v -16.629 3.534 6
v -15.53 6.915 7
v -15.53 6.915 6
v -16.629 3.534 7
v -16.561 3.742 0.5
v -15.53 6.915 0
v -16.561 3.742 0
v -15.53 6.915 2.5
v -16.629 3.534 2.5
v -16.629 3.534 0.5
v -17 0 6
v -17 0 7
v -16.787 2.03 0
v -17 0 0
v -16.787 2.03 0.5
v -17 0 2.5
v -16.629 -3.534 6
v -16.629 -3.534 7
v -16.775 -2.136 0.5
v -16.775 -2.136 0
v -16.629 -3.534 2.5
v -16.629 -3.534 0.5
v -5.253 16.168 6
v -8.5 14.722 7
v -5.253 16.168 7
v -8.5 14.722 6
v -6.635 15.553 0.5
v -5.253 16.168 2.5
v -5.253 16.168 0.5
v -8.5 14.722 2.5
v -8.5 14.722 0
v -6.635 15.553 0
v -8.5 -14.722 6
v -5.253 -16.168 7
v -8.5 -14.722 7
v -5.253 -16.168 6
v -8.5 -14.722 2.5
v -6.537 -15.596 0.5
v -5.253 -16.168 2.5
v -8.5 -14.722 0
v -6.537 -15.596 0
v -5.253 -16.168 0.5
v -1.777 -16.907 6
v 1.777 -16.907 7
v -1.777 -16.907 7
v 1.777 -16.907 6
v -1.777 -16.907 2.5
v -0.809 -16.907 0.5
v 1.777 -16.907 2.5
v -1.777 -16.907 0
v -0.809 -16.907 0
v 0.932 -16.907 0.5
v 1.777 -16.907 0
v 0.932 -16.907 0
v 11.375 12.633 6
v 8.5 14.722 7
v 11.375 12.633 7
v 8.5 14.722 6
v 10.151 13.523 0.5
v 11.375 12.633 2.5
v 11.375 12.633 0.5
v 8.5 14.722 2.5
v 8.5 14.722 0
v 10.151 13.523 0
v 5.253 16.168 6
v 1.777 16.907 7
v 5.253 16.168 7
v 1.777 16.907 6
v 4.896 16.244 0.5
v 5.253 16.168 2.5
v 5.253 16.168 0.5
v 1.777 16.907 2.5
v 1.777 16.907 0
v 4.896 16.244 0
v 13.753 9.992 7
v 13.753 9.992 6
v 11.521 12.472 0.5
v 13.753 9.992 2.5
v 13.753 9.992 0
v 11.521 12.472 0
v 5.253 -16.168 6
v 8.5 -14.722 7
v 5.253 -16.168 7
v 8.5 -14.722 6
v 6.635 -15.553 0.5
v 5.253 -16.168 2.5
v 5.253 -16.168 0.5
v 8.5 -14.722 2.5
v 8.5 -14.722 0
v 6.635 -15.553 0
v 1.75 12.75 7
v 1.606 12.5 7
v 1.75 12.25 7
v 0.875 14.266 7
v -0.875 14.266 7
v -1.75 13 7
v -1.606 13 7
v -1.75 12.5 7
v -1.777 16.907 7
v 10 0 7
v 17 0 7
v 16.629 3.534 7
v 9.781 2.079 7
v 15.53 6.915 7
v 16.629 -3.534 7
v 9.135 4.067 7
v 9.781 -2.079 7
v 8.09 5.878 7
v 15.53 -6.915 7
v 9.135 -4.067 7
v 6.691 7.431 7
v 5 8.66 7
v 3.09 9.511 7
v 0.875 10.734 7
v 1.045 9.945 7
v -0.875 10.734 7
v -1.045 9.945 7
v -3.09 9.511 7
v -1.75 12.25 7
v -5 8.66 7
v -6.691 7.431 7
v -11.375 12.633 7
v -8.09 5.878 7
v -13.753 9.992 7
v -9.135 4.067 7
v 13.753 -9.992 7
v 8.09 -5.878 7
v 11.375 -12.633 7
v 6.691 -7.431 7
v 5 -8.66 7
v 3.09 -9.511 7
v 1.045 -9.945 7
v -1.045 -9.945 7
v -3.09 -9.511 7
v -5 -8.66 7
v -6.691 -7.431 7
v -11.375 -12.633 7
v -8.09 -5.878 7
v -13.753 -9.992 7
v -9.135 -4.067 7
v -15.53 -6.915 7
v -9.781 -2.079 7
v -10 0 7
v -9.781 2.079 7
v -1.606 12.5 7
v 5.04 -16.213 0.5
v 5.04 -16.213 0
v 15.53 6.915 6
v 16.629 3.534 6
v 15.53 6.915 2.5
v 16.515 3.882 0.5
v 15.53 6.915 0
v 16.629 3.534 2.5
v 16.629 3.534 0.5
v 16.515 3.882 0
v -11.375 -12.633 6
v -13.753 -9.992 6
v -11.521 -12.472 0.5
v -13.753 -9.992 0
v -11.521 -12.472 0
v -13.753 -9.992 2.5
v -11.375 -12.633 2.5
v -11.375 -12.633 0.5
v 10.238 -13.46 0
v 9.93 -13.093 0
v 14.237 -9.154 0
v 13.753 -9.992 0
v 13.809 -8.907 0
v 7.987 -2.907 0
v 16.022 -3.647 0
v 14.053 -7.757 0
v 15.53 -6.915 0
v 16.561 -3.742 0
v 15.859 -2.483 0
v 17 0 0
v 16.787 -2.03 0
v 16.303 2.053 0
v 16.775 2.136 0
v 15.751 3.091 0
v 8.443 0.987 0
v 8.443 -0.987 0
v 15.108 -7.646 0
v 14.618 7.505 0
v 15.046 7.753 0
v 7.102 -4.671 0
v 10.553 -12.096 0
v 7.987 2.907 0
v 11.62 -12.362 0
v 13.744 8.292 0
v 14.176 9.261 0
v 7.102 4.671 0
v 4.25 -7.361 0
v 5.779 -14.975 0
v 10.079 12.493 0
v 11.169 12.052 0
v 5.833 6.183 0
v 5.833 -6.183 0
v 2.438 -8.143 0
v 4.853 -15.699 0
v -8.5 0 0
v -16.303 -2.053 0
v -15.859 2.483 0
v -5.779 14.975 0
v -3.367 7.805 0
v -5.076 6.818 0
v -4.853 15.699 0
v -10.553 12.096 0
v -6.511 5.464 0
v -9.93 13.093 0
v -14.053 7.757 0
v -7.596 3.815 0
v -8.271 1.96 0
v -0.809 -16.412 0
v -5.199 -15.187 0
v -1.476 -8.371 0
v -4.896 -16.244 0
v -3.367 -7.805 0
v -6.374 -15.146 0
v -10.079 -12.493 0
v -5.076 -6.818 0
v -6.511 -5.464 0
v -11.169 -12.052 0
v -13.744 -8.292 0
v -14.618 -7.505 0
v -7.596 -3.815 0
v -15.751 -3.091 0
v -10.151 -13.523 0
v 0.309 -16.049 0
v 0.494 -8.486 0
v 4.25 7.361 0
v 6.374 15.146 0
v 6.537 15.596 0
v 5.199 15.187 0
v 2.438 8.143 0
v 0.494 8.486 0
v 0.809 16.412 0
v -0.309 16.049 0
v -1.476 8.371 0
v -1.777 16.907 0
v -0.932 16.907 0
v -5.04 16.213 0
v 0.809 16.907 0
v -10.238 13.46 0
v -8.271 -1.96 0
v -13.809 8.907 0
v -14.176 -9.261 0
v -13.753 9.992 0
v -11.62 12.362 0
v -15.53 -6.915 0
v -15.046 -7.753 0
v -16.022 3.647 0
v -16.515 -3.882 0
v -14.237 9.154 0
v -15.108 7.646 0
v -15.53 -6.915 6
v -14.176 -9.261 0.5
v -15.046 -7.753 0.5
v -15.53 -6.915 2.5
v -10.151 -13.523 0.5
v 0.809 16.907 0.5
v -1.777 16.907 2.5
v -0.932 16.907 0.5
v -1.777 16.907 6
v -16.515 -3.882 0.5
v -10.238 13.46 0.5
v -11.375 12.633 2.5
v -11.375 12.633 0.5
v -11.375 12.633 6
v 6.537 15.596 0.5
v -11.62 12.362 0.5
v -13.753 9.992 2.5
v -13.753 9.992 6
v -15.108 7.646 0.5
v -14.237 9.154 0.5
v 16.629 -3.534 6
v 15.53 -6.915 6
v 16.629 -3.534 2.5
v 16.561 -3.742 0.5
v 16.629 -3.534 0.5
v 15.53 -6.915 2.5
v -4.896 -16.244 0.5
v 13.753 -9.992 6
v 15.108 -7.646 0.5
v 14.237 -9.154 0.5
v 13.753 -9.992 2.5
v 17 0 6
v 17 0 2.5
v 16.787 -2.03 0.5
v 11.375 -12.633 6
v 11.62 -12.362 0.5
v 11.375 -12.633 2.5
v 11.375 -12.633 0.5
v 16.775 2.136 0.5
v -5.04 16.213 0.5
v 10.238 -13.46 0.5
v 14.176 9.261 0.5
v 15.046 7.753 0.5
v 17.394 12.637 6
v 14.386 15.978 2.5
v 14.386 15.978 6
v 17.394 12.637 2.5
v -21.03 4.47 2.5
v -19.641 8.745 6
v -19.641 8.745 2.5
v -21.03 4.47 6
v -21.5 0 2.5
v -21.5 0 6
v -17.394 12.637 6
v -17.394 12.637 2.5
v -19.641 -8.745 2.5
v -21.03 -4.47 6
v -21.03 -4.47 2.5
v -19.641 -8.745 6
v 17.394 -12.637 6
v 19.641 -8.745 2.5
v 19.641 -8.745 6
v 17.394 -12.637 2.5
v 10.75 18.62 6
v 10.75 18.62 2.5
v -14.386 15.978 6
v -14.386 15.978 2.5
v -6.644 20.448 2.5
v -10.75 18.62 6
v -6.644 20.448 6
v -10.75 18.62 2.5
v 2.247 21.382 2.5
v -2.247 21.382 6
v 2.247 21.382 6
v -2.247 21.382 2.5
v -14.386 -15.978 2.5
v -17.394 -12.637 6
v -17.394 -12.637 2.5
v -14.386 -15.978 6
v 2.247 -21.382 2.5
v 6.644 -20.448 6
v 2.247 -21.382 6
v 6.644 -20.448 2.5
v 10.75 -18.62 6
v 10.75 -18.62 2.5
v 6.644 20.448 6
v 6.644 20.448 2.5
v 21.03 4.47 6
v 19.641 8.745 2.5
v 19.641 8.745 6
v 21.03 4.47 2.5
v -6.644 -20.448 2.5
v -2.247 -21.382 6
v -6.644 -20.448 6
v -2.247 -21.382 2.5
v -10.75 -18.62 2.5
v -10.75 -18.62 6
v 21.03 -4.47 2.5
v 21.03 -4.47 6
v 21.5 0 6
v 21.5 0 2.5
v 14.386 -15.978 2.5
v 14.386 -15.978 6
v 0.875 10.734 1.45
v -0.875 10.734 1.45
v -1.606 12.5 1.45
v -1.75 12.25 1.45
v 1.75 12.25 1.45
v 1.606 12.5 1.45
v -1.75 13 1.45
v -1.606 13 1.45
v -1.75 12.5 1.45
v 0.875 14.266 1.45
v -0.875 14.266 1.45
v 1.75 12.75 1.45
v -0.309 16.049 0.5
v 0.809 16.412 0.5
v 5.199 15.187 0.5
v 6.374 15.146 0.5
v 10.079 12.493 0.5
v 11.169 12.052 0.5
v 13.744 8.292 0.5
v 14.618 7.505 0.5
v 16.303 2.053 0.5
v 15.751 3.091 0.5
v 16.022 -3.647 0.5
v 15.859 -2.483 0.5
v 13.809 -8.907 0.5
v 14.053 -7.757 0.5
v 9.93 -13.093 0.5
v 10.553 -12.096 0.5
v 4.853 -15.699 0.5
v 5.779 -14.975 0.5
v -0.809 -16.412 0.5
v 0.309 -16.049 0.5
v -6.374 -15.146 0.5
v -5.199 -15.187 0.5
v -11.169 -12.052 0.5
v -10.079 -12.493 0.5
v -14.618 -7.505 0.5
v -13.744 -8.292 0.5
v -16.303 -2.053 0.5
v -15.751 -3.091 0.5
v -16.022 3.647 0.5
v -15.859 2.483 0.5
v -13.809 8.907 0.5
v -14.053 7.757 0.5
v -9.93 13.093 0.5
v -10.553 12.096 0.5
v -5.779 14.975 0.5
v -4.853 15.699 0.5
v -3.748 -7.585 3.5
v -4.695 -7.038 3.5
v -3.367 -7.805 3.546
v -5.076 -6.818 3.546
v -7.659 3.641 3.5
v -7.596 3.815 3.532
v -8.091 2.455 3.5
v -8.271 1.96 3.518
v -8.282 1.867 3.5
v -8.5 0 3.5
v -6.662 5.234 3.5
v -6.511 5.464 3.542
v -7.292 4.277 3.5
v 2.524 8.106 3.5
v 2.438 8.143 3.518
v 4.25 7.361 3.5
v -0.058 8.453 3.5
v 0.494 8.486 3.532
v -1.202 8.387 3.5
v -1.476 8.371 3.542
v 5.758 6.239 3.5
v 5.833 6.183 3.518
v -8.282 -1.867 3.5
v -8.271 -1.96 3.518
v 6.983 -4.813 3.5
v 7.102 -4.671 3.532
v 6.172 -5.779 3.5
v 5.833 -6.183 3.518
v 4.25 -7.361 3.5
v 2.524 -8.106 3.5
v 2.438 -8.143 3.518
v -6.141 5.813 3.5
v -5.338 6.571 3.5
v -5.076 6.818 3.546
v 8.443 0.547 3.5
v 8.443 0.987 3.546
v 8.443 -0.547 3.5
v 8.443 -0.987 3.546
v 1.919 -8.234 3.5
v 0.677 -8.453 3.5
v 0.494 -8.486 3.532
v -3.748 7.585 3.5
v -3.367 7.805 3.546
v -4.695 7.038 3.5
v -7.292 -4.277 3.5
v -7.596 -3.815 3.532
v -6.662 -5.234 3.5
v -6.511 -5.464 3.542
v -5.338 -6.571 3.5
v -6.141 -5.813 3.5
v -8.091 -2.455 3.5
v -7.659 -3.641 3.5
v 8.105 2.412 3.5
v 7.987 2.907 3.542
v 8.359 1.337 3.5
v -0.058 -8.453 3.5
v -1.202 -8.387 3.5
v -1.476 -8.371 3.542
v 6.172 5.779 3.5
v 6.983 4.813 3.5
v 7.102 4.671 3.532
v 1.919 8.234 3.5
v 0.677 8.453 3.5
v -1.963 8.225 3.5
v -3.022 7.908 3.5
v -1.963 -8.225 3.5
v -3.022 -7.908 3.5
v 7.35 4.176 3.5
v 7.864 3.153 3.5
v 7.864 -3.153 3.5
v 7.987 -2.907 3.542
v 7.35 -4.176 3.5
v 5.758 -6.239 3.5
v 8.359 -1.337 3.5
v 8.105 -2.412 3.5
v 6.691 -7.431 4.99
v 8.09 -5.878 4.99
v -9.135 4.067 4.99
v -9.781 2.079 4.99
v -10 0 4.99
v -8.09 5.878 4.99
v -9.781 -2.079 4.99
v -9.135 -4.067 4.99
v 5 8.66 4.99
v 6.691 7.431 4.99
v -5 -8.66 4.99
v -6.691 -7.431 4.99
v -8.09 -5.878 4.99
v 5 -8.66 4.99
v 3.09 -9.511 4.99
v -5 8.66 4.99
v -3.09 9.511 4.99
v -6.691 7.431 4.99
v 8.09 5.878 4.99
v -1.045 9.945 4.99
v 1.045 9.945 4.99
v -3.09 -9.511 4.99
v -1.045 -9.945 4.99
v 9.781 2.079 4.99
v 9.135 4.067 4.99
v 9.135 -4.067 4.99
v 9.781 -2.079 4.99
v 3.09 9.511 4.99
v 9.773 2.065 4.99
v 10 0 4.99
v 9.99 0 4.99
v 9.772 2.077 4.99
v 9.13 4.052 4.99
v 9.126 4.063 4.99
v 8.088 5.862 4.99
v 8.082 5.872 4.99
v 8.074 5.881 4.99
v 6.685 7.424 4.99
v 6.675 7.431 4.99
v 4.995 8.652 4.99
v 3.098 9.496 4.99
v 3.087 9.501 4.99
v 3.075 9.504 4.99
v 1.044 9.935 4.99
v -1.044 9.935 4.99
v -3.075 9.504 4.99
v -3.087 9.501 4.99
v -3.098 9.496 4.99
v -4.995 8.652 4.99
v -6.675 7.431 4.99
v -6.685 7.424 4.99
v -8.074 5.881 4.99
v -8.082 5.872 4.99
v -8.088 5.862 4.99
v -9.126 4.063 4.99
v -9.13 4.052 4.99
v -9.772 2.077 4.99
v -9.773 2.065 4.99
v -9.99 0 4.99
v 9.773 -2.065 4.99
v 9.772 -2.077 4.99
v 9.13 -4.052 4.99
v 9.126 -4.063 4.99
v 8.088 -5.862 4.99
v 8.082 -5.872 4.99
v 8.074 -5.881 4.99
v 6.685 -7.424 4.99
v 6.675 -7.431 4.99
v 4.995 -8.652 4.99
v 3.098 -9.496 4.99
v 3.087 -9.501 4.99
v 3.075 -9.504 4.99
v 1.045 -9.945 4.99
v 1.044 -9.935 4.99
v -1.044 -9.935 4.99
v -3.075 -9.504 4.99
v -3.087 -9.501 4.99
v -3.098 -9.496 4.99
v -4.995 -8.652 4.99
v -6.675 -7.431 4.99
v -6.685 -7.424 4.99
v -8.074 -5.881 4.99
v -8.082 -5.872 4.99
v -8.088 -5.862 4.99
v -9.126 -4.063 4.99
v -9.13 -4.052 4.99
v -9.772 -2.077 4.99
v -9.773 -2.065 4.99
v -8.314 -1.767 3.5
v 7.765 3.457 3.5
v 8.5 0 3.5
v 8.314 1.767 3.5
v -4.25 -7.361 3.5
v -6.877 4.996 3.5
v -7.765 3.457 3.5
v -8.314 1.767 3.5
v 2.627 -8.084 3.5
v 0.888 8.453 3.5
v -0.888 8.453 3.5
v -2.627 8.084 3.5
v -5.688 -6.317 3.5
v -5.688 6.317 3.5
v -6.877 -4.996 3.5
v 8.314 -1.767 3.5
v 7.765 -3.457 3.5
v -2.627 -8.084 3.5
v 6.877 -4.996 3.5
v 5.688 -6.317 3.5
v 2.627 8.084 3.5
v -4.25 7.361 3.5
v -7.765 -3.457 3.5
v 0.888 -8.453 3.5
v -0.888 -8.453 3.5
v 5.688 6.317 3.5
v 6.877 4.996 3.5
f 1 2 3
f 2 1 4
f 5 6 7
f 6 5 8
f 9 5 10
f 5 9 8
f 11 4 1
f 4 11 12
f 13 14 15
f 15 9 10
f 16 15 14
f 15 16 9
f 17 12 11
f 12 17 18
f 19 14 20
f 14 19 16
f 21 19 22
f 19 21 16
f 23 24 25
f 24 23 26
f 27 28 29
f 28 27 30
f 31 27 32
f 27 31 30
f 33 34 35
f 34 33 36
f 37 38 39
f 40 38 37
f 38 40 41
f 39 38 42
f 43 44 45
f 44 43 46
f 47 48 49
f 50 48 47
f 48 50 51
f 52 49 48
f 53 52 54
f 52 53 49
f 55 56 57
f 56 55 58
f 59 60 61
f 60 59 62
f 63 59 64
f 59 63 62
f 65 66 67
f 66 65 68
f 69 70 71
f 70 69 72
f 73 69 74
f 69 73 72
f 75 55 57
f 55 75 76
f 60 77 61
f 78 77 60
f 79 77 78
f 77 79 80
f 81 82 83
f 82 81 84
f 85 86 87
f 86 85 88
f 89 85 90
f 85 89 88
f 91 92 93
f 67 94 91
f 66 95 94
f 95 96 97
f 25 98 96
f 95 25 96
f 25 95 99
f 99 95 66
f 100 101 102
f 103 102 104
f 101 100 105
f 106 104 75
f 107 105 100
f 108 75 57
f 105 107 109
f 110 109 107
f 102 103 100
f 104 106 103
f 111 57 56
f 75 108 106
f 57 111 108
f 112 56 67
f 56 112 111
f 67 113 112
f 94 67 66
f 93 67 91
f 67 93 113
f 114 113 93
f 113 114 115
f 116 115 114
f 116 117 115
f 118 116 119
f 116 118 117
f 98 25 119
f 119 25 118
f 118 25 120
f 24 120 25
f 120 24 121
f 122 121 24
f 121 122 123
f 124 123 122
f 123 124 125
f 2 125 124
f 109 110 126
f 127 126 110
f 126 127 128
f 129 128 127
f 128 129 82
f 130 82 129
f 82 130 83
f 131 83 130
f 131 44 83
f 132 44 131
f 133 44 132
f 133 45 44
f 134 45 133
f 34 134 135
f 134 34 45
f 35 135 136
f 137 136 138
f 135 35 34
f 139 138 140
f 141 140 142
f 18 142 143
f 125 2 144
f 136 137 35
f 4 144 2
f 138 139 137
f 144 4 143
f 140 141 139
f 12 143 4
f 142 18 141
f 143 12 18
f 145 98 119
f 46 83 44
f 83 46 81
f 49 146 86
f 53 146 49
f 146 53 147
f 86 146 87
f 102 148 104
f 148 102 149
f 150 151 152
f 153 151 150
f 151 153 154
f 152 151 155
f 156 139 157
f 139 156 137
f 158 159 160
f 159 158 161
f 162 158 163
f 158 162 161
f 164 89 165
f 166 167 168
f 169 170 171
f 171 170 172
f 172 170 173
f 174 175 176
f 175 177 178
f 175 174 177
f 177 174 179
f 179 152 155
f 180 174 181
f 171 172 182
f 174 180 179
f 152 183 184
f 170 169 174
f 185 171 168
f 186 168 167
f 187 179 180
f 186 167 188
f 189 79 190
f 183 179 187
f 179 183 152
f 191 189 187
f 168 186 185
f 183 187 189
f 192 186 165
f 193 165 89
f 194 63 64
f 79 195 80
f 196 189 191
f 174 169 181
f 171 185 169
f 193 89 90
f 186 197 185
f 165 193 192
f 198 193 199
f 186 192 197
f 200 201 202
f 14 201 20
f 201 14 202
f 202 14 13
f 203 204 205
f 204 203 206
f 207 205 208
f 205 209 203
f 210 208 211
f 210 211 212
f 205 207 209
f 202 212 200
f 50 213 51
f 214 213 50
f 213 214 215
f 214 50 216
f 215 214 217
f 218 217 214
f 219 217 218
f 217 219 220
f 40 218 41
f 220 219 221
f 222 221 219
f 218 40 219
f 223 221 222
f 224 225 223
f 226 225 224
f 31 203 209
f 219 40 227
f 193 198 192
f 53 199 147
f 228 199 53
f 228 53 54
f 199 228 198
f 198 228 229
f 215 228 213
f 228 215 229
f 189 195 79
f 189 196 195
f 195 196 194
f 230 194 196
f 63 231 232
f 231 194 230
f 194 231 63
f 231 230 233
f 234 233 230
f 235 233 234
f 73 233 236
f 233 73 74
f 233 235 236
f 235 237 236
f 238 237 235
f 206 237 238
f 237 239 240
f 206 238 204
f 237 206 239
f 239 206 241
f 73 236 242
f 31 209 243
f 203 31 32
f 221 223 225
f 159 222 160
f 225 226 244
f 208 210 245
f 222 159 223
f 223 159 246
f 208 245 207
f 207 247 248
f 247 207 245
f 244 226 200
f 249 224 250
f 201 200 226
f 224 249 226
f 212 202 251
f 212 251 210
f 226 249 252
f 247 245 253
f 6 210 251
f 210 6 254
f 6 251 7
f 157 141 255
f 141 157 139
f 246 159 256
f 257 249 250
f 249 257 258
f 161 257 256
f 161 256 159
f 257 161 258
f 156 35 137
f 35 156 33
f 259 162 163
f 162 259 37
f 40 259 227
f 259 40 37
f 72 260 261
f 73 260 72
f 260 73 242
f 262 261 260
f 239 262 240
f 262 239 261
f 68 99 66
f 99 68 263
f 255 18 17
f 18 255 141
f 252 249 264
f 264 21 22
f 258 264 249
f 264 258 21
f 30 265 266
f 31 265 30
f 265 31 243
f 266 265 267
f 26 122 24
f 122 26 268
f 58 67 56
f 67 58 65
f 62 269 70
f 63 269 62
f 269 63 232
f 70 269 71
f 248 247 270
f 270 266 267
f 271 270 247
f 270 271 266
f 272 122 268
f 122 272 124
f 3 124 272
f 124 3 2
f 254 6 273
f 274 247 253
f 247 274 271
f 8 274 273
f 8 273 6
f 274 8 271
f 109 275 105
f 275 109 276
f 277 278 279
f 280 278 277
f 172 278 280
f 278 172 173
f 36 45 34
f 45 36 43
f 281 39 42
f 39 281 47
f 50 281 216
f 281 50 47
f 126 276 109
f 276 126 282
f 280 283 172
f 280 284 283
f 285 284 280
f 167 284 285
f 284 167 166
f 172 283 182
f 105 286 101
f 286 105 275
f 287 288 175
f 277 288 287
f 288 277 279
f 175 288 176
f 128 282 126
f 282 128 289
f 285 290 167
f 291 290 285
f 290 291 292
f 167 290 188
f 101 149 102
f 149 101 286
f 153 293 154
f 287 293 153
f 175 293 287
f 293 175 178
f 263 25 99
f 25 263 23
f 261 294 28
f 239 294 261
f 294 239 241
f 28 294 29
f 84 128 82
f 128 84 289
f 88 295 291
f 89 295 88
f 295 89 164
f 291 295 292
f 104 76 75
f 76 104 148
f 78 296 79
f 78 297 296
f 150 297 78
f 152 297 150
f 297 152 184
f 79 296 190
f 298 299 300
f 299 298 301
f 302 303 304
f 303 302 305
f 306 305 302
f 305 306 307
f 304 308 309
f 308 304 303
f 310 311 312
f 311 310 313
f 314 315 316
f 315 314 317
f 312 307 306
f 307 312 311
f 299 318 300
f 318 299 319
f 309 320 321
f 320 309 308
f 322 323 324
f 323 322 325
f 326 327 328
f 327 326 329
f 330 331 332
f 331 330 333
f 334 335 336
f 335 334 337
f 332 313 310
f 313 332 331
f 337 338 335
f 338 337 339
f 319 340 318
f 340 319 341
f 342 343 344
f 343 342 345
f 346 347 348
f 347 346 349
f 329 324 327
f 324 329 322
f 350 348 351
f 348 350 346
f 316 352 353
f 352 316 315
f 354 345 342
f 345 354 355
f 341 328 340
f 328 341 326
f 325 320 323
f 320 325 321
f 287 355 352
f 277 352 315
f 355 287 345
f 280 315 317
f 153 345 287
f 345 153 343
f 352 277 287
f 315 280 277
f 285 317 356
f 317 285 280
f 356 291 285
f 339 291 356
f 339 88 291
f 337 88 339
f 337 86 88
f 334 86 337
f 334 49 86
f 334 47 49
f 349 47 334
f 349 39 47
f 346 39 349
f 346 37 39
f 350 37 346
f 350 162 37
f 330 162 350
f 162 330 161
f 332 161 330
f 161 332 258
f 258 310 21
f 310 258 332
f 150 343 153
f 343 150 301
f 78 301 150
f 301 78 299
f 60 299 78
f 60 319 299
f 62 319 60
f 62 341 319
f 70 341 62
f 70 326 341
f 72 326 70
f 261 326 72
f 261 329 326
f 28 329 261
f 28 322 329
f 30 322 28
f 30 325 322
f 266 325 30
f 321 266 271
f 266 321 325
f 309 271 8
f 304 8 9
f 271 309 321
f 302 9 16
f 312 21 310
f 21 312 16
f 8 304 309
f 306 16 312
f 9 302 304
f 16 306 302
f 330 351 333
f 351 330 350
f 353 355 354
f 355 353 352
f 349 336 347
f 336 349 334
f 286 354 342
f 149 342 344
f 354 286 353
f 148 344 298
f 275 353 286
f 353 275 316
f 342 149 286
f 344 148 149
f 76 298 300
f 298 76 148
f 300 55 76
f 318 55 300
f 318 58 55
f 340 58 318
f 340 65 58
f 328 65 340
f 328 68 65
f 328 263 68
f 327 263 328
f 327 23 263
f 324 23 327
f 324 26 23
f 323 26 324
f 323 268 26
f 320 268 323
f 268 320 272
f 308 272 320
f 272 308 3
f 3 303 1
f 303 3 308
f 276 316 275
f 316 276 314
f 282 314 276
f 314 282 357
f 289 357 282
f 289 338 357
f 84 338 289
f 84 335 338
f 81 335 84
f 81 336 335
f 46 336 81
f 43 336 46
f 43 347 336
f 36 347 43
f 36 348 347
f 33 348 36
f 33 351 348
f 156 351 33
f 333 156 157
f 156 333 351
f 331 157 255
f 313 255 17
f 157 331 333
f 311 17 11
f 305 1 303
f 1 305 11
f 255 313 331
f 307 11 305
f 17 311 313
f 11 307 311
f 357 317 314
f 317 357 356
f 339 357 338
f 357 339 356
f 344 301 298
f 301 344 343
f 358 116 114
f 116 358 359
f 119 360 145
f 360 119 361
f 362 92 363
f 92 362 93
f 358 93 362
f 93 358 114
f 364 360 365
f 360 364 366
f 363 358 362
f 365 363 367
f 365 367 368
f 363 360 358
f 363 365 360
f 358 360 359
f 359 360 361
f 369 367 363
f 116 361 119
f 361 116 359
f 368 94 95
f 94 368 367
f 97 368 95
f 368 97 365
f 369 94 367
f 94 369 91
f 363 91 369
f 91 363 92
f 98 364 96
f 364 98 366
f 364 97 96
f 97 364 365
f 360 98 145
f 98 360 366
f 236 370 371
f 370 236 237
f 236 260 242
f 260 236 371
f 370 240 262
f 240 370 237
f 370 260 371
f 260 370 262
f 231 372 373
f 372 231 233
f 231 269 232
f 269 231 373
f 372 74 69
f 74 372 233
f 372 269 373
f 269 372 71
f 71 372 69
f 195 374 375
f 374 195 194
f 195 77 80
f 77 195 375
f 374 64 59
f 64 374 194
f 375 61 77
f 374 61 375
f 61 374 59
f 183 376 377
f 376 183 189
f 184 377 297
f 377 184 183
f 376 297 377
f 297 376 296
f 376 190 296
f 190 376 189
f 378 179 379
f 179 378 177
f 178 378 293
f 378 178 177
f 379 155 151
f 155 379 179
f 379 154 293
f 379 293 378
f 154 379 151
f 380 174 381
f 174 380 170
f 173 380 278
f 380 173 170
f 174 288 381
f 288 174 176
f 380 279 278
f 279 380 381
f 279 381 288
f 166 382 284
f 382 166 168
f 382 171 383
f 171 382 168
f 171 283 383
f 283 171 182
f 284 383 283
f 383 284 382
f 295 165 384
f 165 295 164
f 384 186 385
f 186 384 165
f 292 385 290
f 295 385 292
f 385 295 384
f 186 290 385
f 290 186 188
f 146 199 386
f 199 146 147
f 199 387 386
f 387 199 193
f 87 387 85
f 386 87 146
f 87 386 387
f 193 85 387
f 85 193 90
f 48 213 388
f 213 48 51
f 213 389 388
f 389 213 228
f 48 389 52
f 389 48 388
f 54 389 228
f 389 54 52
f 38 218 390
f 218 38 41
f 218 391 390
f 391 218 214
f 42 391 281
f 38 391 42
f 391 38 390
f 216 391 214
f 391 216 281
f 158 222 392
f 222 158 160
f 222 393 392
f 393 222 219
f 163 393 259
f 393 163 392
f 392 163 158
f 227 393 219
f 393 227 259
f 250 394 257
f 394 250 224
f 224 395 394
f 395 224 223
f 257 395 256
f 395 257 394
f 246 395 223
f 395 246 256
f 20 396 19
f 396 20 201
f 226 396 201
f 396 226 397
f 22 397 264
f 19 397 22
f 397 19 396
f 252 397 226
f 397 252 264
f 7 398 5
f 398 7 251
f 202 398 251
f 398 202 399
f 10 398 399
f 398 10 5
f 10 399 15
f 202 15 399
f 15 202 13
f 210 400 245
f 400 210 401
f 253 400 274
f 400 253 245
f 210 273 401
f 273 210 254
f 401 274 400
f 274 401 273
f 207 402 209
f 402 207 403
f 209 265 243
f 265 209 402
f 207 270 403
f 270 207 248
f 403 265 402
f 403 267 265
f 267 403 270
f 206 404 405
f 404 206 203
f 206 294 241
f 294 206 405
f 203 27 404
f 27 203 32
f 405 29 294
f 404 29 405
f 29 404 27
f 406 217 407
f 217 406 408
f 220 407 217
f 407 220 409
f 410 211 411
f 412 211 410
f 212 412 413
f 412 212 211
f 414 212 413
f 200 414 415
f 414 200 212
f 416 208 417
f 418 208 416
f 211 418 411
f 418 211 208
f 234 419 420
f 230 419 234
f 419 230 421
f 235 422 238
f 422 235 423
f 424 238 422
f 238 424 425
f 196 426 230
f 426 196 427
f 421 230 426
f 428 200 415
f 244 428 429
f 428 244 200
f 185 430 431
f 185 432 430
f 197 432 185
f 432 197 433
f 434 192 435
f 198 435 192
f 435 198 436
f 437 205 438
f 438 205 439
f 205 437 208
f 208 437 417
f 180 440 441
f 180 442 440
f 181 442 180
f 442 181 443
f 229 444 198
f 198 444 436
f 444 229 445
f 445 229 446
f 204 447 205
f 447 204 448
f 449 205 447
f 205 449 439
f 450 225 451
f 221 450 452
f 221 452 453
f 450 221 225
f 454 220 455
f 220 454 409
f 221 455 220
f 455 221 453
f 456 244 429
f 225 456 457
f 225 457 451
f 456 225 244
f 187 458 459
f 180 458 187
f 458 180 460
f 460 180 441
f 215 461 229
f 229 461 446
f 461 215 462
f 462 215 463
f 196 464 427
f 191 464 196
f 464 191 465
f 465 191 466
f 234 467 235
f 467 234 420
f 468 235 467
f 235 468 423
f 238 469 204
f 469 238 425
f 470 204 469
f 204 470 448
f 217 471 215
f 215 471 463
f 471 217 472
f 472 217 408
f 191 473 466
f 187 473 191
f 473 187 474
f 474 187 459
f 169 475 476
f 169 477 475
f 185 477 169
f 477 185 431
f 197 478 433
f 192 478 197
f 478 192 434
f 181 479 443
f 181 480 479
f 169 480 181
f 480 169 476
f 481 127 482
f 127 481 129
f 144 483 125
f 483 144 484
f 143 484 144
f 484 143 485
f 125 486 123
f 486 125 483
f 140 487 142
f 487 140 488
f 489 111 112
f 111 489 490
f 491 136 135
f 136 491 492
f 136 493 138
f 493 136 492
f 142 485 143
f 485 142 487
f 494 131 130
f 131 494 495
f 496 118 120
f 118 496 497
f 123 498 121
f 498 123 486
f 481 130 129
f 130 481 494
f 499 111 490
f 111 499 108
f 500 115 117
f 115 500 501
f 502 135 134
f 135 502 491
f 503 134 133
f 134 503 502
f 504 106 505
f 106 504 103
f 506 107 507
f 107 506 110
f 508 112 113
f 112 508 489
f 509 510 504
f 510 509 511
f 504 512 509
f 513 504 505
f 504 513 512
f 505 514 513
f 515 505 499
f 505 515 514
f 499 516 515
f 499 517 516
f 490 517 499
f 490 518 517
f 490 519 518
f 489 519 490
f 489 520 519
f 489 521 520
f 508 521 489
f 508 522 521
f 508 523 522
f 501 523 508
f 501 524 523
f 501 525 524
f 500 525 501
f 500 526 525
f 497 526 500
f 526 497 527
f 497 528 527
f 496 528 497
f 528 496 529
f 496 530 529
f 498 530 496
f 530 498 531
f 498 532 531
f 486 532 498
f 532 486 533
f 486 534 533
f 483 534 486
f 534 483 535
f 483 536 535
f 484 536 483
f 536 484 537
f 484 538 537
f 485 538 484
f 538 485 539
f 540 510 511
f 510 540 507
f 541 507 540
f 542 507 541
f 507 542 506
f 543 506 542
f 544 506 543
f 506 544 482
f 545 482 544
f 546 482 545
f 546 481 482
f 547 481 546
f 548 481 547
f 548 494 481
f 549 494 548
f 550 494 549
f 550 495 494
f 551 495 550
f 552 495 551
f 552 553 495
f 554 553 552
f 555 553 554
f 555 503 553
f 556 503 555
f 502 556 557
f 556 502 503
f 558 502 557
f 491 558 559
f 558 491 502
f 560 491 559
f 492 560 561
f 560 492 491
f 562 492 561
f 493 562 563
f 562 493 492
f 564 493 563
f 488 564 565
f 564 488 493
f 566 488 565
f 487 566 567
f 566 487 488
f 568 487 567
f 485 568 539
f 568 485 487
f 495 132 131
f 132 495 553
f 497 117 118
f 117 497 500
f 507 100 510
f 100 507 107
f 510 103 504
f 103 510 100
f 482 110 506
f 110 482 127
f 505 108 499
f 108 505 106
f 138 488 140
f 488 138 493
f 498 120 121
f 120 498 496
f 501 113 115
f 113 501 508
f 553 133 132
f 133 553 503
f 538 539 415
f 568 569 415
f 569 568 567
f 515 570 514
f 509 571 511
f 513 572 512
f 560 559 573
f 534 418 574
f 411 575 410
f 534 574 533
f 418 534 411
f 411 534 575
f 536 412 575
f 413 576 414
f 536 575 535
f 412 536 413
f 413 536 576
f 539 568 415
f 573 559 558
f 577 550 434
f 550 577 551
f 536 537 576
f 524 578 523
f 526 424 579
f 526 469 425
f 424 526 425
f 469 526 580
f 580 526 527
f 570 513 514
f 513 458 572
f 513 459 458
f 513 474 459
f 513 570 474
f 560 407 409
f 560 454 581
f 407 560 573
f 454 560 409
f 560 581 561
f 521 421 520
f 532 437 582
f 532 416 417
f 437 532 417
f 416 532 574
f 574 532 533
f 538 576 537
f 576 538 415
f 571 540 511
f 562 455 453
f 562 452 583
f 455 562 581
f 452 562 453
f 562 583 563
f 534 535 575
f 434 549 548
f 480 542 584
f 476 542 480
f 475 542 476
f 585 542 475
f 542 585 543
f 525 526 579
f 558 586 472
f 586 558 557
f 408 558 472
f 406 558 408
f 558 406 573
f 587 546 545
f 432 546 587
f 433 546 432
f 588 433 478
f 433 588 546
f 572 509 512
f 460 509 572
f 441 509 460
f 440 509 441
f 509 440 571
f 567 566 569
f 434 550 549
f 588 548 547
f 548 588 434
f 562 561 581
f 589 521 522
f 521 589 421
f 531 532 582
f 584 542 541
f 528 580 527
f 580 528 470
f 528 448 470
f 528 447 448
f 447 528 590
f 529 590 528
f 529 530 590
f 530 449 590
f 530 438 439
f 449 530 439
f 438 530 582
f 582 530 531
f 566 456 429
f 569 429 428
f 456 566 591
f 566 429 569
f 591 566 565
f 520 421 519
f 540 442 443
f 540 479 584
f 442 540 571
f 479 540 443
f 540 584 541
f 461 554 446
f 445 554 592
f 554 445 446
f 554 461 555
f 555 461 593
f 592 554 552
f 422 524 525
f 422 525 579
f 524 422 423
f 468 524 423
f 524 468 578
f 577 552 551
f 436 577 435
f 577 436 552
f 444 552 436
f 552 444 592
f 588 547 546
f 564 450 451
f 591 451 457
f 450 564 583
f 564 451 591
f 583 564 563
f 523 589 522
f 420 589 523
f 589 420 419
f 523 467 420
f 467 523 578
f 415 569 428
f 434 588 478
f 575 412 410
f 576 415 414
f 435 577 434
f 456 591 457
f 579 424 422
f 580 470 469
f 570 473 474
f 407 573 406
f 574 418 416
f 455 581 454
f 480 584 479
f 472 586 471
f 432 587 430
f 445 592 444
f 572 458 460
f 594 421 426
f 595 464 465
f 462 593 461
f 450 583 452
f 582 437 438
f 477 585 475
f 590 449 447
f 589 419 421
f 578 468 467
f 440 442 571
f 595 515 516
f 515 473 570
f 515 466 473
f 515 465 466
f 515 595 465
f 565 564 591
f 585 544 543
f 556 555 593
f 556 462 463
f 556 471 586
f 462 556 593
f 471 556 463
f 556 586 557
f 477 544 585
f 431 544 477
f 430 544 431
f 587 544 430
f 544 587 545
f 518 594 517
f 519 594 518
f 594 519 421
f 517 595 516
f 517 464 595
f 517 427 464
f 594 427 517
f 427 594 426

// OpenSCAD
// Rotate the disc by 180 degrees to flip it upside down, which
// makes it easier to print the hole, etc. Lift it up by 7mm to bring
// it back above the axis // (the entire body is 7mm high).
translate([0, 0, 7]) rotate(a=[0,180,0]) difference() {
	union() {
		// Big cylinder for placement inside the machine.
		cylinder(h = 7, r = 17);

		// Outer cylinder; any sewing information would go here.
		translate([0, 0, 1]) cylinder(h = 3.5, r = 21.5);
	}

	// Subtract the inner hole. Be very generous.
	translate([0, 0, 4])
		cylinder(h = 10, r = 8.5, center=true);

	// Subtract the lower cone.
	cylinder(h = 2.01, r = 10);

	// Subtract the diagonal layer the disk rests on.
	translate([0, 0, 2])
		cylinder(h = 1.5, r1 = 10, r2 = 8.5);

	// Transport hole
	union() {
		translate([0, 12.25, -0.05])
			cylinder(h = 5.6, r=1.75);
		translate([0, 12.75, -0.05])
			cylinder(h = 5.6, r=1.75);
		translate([0, 12.5, -0.05])
			cube(size = [1.75, 0.5, 5.6]);
	}

	// Mark the 18 stitches.
	// This is where the needle is at its deepest point.
	// Only for modelling, remove before print!
	for (z=[0 : 17]) // 18 times
	{
		rotate(a=[0, 0, z*20]) { 
   		translate([0, 17, 7])
				cylinder(h= 1, r=1, center=true);
		}
	}
}
